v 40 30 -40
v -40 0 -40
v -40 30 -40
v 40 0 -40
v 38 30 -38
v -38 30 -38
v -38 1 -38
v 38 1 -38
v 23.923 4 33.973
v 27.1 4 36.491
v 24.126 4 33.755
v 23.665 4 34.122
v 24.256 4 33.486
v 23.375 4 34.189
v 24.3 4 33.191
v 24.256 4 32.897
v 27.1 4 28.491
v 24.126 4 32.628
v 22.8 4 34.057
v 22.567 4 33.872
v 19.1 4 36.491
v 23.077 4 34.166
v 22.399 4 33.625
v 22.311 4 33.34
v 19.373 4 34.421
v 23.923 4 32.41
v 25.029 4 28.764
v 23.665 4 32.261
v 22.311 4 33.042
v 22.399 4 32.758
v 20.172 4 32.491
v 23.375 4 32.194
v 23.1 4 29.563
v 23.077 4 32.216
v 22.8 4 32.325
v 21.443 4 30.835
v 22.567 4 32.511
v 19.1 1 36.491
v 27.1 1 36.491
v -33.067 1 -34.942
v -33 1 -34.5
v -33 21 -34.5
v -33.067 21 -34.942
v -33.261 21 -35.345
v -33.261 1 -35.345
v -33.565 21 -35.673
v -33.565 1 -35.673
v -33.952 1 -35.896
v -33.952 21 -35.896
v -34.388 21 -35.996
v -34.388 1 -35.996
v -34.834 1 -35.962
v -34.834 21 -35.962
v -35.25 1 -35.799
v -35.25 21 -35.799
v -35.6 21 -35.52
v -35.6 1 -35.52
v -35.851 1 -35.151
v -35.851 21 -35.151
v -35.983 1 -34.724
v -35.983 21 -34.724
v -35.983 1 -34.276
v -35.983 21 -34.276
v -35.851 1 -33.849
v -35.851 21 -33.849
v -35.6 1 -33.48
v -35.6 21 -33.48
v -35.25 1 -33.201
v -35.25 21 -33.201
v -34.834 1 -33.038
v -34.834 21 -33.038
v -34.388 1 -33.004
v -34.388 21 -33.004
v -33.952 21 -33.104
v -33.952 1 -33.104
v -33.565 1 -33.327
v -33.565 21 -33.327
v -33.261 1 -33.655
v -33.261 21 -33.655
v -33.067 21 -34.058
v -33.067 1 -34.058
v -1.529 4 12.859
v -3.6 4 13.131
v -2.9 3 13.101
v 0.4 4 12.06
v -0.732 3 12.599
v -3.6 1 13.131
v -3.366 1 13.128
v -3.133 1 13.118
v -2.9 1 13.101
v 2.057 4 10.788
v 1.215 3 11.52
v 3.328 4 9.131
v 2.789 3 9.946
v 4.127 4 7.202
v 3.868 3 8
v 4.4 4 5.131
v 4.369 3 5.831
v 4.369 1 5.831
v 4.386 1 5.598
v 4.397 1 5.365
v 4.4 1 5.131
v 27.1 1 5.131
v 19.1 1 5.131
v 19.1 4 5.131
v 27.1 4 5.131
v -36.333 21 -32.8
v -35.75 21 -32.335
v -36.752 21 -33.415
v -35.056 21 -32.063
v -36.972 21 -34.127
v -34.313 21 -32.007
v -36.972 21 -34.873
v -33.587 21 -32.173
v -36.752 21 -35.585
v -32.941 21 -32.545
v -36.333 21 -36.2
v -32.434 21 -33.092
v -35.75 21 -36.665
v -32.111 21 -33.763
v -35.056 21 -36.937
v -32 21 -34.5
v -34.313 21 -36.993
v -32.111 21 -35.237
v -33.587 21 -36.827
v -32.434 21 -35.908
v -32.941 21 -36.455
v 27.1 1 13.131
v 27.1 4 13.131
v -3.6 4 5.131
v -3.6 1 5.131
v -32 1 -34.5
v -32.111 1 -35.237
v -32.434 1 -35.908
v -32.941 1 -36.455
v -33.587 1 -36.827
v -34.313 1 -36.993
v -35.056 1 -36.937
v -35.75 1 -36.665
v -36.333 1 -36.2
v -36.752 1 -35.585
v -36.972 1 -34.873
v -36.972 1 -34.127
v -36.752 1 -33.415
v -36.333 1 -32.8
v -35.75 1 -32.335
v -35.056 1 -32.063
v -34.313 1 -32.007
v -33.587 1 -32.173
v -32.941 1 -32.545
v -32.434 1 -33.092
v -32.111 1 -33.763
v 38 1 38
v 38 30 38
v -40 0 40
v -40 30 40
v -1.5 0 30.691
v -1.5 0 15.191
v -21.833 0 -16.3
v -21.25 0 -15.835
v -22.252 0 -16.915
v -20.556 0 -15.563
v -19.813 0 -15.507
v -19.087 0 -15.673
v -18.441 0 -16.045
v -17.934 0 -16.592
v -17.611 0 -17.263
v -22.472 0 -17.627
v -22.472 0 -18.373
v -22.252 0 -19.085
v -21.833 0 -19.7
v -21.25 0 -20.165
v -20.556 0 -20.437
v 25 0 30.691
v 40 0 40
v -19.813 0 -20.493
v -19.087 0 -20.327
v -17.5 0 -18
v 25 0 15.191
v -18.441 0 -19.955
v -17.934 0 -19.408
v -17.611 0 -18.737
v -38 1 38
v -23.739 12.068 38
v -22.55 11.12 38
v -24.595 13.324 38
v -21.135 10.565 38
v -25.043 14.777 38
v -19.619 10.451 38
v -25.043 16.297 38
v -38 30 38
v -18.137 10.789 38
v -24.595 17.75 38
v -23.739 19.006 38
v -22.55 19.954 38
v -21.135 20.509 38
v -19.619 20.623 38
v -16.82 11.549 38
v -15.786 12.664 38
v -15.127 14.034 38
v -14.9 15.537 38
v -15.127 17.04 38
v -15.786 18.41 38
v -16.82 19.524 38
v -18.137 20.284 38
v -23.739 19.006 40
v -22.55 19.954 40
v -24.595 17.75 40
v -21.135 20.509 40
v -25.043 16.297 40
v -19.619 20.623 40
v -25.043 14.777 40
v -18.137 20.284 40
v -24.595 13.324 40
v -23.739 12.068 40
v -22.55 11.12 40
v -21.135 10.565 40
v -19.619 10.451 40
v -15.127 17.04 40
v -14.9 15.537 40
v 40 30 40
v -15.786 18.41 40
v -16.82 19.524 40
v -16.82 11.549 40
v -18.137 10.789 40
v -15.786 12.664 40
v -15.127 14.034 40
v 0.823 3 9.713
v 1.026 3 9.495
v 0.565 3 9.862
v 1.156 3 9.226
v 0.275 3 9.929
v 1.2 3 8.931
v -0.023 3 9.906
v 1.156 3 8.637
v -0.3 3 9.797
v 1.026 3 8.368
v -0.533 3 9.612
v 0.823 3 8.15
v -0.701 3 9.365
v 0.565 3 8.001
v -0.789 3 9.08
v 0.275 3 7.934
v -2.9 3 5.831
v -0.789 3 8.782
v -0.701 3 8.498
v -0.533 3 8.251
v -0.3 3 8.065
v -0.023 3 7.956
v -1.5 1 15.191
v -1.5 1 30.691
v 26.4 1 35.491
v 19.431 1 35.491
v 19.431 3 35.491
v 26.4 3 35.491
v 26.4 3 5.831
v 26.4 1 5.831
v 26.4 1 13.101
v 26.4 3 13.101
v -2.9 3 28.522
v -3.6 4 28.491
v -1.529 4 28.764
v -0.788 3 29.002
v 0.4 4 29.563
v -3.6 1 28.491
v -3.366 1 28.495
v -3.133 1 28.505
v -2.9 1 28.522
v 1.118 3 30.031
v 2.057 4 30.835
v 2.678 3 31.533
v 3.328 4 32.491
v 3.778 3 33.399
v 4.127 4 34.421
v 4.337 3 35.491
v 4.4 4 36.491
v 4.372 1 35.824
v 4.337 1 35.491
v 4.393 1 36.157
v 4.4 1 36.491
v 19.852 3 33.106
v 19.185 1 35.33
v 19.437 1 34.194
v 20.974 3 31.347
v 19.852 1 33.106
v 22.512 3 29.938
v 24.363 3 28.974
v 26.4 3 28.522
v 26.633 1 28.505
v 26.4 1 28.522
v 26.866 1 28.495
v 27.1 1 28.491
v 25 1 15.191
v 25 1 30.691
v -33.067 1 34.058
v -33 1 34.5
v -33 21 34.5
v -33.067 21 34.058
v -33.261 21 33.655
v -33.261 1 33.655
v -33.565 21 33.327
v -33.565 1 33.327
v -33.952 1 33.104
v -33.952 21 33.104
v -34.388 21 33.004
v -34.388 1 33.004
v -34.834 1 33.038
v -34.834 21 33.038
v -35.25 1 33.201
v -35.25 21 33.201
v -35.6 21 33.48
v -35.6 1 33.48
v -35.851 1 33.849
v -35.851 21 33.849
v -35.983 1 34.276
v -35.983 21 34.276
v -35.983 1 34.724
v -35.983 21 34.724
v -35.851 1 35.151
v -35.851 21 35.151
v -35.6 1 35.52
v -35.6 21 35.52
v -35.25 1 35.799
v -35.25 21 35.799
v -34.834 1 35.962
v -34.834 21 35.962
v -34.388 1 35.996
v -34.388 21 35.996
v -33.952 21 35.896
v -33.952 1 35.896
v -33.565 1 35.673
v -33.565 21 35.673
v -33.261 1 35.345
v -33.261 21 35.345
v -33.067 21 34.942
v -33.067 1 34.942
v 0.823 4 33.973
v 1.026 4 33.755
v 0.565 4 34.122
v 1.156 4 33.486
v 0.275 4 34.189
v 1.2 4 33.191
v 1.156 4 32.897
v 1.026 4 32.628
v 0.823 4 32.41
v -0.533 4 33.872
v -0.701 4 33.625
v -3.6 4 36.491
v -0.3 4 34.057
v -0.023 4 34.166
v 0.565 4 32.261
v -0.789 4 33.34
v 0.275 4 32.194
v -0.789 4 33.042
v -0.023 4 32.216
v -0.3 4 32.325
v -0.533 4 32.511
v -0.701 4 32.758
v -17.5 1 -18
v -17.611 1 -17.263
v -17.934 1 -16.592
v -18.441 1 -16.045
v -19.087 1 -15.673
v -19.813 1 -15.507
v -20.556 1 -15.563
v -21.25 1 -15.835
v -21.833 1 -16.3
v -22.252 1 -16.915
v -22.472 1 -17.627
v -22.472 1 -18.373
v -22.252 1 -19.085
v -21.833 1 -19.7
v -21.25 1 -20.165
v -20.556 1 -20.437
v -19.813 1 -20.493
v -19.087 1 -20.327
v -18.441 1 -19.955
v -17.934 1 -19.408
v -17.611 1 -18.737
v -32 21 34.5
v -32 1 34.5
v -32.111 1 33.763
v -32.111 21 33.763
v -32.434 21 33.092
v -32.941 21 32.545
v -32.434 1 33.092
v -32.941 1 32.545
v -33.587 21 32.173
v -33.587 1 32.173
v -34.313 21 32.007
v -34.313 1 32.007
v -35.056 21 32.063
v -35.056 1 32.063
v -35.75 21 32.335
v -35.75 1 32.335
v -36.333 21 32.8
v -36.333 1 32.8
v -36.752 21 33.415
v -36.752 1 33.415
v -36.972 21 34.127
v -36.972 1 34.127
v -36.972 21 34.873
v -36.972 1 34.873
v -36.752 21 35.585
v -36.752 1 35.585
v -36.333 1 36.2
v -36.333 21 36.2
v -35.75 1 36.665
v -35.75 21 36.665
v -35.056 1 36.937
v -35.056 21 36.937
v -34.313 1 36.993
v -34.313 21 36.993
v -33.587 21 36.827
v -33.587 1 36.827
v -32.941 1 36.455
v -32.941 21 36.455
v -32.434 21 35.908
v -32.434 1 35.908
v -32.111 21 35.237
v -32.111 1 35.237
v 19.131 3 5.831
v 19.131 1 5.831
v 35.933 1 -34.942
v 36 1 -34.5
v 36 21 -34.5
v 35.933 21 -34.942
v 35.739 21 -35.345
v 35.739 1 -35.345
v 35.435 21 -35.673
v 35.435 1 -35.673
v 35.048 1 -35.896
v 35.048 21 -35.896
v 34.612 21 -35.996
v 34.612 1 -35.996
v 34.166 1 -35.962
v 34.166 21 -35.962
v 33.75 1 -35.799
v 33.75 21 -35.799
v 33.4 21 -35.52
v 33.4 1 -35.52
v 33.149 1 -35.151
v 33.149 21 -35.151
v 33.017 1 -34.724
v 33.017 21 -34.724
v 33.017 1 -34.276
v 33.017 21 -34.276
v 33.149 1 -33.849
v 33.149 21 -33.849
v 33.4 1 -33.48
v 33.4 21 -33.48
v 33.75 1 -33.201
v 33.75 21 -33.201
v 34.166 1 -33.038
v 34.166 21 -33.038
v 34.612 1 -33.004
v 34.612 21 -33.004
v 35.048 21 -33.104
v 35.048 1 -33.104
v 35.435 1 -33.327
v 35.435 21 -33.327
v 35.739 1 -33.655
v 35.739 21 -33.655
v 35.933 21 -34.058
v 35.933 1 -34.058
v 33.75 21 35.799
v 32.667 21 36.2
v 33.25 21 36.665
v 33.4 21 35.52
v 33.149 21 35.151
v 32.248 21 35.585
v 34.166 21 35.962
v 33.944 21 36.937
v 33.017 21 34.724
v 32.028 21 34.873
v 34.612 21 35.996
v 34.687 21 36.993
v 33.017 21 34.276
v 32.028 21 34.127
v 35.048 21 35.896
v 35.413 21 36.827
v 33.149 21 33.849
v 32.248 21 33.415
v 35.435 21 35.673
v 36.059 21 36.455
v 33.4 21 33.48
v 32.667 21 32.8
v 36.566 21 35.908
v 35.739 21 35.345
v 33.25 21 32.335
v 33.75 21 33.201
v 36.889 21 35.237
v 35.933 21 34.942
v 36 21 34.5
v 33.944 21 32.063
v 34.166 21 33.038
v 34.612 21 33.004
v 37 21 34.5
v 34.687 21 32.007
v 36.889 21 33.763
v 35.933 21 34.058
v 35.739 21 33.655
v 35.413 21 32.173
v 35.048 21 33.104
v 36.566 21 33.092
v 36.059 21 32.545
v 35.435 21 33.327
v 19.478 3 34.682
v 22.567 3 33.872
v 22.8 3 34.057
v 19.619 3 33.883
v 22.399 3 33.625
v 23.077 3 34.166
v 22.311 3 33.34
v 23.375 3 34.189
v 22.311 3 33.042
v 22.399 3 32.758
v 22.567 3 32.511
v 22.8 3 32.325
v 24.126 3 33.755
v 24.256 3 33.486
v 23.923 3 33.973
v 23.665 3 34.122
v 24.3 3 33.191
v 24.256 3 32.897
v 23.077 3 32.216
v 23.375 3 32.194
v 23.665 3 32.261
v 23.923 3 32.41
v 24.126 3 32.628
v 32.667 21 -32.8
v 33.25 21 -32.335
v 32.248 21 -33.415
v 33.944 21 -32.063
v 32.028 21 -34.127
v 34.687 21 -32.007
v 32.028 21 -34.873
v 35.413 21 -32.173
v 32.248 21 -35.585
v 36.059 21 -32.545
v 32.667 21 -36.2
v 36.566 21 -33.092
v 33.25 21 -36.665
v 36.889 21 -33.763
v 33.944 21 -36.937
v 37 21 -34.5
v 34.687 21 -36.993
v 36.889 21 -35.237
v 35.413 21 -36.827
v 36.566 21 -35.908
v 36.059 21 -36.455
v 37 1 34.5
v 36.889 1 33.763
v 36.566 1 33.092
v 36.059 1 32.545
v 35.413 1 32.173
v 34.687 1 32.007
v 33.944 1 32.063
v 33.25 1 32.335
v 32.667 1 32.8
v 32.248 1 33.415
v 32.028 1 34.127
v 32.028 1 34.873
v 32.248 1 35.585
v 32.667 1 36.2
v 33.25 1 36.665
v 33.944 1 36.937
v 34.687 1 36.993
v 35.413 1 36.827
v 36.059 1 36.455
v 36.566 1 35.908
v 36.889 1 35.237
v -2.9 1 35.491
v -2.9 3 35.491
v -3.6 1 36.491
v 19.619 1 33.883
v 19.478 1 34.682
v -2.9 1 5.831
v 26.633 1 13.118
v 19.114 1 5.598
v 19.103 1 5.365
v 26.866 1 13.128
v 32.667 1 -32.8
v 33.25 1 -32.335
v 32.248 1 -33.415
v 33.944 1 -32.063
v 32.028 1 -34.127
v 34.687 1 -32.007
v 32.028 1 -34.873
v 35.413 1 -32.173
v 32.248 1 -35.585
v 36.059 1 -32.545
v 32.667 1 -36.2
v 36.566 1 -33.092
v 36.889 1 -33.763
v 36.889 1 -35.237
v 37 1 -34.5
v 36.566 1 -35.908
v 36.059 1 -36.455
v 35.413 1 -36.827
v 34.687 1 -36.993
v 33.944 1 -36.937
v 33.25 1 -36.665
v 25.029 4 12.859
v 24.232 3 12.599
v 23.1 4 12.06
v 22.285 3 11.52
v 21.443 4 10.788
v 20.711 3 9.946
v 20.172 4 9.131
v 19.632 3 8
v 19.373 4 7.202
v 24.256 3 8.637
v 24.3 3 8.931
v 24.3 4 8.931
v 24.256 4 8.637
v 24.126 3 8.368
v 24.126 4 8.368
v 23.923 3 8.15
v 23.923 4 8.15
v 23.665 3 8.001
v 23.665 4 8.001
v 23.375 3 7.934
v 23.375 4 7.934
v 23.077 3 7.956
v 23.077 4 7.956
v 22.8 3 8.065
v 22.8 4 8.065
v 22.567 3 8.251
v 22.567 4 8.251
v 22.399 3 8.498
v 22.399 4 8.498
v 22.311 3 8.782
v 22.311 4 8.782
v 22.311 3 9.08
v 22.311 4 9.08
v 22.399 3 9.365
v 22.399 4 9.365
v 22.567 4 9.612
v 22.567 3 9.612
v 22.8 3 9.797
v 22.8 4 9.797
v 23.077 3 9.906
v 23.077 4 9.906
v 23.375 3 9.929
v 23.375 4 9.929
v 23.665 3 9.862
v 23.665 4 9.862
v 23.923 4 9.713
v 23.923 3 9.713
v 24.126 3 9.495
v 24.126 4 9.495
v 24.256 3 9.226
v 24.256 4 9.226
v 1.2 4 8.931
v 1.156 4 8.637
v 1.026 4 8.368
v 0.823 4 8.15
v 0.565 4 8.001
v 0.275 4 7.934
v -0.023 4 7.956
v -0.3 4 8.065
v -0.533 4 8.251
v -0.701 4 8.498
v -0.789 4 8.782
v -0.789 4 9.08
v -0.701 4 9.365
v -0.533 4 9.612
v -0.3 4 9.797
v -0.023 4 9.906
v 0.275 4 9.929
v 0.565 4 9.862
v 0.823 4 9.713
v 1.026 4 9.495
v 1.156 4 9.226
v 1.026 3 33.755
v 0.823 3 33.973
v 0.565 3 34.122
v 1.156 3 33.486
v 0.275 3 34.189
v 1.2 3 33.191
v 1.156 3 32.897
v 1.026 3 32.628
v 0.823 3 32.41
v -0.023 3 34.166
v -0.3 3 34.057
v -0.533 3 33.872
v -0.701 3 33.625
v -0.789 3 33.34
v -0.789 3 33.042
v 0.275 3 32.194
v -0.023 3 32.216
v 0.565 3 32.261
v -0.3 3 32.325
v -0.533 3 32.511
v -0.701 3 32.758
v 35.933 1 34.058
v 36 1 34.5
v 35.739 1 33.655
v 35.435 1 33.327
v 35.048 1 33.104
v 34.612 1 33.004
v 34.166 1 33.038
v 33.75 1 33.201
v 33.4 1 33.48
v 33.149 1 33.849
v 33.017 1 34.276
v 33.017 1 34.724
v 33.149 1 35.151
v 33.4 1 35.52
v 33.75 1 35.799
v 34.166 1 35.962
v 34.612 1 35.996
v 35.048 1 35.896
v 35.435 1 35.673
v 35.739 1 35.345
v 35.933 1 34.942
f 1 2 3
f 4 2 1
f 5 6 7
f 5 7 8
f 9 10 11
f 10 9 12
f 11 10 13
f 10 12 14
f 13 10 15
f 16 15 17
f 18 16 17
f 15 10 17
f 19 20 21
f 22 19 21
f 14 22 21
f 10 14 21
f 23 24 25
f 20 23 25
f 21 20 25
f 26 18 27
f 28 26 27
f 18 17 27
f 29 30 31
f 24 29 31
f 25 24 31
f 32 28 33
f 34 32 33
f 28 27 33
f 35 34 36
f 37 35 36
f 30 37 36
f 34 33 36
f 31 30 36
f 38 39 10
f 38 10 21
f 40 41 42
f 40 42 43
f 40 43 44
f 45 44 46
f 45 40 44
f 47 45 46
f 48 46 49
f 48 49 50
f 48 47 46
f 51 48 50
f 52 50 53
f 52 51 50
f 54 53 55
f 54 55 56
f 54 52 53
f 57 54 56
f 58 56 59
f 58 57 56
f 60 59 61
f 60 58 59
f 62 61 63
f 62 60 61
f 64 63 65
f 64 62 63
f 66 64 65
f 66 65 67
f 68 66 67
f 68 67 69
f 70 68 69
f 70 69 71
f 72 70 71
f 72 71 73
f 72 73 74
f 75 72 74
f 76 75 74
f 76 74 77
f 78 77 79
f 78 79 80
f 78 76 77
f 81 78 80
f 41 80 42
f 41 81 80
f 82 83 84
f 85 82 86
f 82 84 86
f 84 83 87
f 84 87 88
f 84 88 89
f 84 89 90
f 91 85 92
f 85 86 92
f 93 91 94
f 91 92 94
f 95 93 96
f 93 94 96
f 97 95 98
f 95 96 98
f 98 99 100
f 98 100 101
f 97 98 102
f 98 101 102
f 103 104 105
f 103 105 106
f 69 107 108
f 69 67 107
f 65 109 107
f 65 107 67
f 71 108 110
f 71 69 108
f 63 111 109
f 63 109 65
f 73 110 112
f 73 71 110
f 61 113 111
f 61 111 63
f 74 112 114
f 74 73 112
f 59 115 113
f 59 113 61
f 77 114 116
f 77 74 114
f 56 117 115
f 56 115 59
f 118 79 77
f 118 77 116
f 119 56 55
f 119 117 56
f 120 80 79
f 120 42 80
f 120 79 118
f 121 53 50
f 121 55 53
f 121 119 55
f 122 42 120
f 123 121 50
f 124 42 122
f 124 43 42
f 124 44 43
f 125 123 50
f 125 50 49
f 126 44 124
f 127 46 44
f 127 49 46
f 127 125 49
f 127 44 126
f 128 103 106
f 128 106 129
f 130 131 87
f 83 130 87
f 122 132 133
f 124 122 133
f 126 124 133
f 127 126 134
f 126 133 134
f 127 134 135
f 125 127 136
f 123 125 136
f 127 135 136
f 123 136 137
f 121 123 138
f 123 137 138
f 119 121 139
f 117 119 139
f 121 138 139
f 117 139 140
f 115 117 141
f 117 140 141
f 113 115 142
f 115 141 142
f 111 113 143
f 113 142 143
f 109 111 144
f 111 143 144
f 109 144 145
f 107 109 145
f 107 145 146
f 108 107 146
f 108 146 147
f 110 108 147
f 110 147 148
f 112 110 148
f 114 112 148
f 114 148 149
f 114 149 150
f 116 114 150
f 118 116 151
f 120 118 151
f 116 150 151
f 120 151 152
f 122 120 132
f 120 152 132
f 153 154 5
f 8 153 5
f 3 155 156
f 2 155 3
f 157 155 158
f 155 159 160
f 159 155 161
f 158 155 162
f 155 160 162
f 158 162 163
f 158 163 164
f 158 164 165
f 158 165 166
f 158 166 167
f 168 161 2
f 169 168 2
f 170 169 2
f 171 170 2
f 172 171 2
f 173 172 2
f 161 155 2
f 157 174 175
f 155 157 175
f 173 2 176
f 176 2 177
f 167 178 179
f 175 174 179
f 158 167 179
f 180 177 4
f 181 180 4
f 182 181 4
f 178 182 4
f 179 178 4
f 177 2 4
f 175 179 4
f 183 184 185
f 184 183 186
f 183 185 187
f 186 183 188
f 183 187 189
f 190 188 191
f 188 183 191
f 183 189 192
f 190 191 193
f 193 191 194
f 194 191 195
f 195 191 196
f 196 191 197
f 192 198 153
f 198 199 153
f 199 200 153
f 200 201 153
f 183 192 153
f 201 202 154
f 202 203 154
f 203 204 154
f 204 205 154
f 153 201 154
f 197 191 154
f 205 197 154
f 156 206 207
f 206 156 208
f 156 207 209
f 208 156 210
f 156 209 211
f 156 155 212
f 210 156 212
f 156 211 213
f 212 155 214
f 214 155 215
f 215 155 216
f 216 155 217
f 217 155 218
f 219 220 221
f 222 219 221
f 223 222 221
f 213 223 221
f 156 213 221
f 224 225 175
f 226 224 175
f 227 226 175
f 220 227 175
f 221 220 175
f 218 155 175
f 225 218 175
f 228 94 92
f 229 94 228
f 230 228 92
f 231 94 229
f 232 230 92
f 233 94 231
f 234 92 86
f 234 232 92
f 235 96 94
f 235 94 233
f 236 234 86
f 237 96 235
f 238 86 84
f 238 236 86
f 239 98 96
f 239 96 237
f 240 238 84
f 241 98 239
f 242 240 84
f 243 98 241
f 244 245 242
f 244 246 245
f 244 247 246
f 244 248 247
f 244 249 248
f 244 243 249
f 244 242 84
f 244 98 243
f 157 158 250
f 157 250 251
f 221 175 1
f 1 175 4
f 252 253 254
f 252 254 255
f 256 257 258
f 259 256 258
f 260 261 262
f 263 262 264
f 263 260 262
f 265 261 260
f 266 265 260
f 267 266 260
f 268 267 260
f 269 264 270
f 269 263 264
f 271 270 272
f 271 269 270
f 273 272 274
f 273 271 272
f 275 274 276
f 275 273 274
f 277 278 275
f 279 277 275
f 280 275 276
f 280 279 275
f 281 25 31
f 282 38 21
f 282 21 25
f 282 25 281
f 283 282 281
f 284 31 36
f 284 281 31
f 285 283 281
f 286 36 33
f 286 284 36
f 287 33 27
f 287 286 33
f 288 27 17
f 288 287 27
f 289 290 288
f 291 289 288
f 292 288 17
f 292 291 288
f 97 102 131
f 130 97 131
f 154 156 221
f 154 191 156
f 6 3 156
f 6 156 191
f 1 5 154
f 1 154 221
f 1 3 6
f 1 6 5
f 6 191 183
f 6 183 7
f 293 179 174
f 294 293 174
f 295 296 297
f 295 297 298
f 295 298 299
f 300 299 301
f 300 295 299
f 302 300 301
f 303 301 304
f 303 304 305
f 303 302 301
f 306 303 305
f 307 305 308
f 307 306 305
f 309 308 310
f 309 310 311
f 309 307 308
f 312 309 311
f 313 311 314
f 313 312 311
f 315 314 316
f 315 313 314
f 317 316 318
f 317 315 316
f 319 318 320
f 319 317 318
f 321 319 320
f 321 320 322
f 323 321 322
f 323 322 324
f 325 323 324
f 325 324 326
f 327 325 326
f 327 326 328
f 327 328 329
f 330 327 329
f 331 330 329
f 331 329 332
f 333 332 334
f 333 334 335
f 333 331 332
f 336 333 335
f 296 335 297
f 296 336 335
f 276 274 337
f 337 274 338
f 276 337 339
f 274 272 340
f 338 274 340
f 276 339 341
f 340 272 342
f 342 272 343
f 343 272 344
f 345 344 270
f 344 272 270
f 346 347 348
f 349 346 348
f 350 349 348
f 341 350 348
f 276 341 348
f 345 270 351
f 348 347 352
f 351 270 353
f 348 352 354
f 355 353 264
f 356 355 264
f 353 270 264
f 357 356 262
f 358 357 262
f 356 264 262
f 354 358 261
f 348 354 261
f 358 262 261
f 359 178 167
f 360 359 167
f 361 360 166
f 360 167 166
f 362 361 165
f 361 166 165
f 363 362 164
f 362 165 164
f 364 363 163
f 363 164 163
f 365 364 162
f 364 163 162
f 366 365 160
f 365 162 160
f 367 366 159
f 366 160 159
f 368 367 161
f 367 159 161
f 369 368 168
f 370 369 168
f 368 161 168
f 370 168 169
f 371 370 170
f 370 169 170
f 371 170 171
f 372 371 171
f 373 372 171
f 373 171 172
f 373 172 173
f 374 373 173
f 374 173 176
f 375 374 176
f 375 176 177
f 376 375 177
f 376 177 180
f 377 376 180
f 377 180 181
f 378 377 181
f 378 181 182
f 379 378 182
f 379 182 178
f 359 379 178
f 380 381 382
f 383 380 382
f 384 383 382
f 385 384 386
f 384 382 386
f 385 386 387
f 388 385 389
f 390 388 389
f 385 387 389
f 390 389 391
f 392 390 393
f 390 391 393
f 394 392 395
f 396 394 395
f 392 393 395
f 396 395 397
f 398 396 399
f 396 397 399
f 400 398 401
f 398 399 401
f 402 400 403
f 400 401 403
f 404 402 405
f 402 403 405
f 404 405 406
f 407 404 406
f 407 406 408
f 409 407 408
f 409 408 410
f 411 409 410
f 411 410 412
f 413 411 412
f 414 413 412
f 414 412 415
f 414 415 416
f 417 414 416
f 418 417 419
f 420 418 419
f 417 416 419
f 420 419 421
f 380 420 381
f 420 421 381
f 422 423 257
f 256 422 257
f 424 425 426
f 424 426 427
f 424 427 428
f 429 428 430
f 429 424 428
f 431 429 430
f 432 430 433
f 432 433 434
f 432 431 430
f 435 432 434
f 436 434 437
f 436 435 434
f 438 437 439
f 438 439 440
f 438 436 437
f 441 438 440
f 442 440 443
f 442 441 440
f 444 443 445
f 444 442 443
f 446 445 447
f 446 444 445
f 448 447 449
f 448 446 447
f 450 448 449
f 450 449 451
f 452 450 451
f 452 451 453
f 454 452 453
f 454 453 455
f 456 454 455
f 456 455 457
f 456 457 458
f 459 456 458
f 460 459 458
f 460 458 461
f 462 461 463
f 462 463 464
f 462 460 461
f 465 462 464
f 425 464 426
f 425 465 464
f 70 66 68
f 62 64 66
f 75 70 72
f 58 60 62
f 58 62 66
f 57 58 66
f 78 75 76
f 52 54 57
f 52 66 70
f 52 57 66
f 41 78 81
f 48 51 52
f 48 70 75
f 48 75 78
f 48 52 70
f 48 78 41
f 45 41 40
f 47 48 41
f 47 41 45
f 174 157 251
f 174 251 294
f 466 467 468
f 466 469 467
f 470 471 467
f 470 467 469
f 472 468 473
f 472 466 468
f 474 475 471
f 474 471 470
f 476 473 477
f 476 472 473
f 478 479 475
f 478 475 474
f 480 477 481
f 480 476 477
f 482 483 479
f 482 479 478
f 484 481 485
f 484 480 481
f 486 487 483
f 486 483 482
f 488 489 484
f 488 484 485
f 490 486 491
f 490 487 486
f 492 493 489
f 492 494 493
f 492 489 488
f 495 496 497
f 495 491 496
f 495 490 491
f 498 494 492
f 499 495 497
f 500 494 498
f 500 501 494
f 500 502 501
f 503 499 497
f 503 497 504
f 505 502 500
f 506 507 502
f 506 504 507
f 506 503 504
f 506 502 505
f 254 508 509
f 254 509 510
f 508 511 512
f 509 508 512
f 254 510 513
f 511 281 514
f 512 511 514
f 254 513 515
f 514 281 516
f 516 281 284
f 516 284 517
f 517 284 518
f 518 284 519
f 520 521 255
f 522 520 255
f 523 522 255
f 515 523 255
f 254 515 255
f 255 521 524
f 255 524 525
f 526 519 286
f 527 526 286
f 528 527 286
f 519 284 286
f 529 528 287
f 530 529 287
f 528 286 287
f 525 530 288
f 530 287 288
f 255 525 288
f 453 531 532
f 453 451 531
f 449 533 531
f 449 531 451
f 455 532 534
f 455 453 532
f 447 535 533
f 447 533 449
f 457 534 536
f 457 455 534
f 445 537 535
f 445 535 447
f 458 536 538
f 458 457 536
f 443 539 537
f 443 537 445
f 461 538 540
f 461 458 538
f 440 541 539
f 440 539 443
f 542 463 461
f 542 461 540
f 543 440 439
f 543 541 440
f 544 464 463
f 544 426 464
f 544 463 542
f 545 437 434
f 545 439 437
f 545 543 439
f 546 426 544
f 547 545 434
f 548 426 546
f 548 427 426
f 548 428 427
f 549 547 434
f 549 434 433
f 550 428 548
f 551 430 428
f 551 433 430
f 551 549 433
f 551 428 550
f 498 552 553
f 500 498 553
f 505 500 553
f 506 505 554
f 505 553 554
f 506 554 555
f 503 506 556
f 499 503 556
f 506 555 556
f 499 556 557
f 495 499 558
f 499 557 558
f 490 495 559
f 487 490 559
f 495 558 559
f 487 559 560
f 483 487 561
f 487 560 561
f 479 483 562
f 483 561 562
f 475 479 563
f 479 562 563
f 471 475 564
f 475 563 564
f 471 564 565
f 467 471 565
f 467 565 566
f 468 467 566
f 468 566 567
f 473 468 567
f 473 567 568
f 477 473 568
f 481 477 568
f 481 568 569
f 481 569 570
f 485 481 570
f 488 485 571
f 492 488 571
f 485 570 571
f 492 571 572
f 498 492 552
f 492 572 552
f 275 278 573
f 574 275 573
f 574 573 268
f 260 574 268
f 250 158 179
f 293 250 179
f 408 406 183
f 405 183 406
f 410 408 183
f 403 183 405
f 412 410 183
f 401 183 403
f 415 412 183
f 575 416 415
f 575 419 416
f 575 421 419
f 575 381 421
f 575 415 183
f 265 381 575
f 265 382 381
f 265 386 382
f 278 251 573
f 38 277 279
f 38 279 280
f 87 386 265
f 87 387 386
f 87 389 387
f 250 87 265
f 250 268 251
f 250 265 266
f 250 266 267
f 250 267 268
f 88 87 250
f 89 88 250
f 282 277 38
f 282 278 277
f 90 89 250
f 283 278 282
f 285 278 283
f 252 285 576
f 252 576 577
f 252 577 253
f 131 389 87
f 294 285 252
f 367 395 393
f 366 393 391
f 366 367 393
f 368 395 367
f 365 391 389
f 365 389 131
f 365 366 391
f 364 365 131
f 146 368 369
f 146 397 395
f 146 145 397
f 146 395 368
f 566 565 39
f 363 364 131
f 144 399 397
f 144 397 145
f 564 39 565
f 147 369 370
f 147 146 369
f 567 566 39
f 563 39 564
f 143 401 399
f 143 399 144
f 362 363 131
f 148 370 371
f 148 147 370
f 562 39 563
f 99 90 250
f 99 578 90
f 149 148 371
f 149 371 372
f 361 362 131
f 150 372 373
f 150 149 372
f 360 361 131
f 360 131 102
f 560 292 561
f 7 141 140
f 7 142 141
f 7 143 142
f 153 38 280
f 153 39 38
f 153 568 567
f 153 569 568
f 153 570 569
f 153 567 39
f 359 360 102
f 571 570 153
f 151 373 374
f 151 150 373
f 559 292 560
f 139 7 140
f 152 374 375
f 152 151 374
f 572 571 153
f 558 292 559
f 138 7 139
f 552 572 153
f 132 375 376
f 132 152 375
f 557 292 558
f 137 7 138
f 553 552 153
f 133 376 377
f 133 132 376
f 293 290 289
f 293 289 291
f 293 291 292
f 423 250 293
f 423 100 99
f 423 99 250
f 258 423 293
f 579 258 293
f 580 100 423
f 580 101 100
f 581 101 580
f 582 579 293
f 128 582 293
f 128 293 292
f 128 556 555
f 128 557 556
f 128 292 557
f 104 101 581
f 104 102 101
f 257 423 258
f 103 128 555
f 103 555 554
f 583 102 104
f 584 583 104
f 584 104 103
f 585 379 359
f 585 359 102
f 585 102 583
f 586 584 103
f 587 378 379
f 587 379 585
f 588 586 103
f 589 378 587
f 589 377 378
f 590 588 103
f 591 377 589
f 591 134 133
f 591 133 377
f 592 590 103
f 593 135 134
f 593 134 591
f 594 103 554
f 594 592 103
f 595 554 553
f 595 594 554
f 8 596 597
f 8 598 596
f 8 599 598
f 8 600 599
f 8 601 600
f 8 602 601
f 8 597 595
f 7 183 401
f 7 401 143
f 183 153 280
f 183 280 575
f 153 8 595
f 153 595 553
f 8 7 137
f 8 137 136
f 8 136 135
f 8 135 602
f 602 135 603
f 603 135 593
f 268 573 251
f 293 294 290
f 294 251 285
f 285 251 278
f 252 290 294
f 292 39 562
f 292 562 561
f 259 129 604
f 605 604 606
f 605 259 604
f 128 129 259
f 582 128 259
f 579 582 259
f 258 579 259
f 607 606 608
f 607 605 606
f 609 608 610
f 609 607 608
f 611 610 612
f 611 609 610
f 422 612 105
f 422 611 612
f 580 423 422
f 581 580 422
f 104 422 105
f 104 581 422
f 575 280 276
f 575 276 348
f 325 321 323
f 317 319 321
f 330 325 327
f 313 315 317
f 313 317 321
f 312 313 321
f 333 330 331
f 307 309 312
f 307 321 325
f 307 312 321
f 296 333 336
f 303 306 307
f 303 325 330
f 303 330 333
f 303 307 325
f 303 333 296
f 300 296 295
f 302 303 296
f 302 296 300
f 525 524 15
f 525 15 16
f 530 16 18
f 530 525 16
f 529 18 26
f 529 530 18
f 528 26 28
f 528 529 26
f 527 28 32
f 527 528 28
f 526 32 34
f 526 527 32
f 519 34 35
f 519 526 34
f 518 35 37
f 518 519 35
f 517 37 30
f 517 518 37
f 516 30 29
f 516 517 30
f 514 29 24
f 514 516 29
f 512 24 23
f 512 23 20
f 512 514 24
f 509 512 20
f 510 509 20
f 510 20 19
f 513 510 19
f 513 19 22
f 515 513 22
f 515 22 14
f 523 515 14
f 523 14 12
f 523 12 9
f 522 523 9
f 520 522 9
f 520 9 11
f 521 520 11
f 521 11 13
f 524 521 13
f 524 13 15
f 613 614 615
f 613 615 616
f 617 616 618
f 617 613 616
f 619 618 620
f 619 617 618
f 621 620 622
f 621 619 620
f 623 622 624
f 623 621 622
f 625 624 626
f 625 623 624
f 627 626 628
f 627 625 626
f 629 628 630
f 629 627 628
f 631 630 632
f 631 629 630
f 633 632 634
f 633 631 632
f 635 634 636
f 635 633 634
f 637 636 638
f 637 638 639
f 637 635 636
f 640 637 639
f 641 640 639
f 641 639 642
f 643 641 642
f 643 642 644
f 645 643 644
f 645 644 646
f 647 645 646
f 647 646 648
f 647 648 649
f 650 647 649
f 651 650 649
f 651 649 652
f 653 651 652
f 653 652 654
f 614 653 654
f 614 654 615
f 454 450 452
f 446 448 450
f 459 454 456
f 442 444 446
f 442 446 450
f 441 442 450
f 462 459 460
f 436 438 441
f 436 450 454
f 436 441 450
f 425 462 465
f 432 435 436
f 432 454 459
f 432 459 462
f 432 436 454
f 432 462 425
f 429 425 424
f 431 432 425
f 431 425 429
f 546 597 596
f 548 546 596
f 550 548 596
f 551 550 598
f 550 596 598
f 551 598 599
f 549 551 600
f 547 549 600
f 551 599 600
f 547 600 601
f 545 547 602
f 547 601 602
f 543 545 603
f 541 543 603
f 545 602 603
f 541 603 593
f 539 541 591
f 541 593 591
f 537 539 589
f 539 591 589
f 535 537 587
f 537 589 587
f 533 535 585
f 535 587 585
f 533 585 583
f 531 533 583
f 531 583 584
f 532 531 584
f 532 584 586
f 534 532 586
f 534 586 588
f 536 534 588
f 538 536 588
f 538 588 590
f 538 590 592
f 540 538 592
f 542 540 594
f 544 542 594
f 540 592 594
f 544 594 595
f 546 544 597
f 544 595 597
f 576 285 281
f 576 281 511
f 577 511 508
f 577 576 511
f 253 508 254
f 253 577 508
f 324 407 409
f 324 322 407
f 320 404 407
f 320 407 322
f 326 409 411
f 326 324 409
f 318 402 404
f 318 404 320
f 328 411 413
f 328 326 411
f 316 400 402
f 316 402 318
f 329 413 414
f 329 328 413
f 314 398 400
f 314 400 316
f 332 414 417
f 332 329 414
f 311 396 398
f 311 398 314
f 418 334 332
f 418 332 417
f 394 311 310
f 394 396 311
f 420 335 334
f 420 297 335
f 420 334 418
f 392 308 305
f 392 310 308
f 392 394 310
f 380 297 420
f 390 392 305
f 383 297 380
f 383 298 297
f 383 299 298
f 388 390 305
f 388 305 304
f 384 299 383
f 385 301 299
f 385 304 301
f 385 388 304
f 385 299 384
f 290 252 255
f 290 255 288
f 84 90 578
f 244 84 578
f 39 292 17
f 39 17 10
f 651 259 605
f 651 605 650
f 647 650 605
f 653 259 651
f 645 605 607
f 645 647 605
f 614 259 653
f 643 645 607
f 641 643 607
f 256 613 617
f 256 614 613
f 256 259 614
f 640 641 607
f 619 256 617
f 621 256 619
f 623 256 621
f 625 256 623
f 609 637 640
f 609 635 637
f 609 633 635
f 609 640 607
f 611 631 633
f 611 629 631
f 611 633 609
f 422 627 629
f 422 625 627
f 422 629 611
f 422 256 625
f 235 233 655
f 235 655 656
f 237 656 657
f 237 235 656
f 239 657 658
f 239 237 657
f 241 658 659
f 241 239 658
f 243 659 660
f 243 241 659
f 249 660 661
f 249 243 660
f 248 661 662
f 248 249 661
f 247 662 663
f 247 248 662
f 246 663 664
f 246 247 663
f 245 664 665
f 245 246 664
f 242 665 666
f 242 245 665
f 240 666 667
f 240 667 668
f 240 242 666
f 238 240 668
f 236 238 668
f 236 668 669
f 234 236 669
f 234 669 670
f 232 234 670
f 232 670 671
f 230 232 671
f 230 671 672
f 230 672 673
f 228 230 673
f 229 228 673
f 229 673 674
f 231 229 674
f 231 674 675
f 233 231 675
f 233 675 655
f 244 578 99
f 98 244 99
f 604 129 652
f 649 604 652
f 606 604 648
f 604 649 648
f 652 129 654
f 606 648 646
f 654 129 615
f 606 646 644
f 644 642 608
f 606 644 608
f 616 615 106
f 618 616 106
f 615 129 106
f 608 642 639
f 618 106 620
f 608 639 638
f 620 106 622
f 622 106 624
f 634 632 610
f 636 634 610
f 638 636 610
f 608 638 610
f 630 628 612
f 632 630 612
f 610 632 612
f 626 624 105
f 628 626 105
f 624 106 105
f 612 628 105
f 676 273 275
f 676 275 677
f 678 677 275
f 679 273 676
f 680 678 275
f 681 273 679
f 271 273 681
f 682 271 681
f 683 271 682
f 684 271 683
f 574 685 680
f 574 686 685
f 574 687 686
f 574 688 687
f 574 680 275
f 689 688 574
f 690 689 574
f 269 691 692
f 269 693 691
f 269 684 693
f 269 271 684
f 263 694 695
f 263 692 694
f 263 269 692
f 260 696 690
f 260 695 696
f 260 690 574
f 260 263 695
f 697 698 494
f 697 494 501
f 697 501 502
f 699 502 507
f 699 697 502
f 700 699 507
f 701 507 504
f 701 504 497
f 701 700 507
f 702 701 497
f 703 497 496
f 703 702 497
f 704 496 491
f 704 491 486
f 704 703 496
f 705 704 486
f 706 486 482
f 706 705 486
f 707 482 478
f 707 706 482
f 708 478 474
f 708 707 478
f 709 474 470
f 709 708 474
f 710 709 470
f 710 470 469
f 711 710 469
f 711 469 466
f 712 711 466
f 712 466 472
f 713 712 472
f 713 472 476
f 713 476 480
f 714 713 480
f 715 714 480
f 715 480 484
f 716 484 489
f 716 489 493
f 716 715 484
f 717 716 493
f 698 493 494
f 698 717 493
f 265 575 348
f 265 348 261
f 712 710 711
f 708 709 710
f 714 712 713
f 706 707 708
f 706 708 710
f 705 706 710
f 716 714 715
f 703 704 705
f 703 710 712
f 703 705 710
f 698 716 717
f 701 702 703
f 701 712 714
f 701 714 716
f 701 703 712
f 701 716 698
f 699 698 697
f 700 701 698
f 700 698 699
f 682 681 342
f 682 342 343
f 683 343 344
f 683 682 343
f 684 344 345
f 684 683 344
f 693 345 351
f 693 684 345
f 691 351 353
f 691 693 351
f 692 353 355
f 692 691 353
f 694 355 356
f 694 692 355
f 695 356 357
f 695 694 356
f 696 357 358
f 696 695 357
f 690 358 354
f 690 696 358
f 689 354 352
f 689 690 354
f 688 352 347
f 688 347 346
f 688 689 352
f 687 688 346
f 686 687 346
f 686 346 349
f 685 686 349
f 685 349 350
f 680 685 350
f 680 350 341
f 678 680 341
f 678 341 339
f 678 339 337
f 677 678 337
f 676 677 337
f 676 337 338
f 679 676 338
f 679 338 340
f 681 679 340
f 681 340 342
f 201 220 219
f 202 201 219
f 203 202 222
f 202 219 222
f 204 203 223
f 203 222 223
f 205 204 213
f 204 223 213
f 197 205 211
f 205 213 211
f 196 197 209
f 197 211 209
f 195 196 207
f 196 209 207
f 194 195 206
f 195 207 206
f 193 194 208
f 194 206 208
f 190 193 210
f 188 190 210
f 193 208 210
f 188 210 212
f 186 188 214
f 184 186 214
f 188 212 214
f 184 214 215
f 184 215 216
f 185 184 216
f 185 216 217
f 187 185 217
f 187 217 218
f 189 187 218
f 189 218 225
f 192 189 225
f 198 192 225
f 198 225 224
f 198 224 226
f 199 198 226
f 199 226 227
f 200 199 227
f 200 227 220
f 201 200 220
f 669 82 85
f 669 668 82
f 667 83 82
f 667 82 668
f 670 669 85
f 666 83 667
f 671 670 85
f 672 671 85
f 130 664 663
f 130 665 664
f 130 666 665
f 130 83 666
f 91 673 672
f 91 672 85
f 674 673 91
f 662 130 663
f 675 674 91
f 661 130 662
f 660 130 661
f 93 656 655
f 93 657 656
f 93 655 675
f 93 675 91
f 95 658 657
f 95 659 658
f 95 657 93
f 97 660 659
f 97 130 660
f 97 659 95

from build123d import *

# Parameters (mm, degrees)
SKETCH1_W           = 80
SKETCH1_H           = 80
BOSS_EXTRUDE1_DEPTH = 30
SKETCH2_W           = 76
SKETCH2_H           = 76
CUT_EXTRUDE1_DEPTH  = 29
SKETCH3_R           = 2.5
SKETCH3_R_2         = 1.5
BOSS_EXTRUDE5_DEPTH = 20
SKETCH4_R           = 2.5
CUT_EXTRUDE2_DEPTH  = 10
SKETCH5_W           = 26.5
SKETCH5_H           = 15.5
CUT_EXTRUDE3_DEPTH  = 25
SKETCH6_R           = 5.1
CUT_EXTRUDE4_DEPTH  = 10
BOSS_EXTRUDE6_DEPTH = 3
CUT_EXTRUDE5_DEPTH  = 2
SKETCH10_R          = 1
CUT_EXTRUDE6_DEPTH  = 3


with BuildPart() as part:
    # Sketch1 → Boss-Extrude1 (new body)
    with BuildSketch(Plane(origin=(0, 0, 0), x_dir=(1, 0, 0), z_dir=(0, 1, 0))):
        Rectangle(SKETCH1_W, SKETCH1_H)
    extrude(amount=BOSS_EXTRUDE1_DEPTH)

    # Sketch2 → Cut-Extrude1 (cut)
    with BuildSketch(Plane(origin=(0, 30, 0), x_dir=(1, 0, 0), z_dir=(0, 1, 0))):
        Rectangle(SKETCH2_W, SKETCH2_H)
    extrude(amount=-CUT_EXTRUDE1_DEPTH, mode=Mode.SUBTRACT)

    # Sketch3 → Boss-Extrude5 (add)
    with BuildSketch(Plane(origin=(0, 1, 0), x_dir=(1, 0, 0), z_dir=(0, 1, 0))):
        with Locations((-34.5, 34.5)):
            Circle(SKETCH3_R)
        with Locations((-34.5, 34.5)):
            Circle(SKETCH3_R_2, mode=Mode.SUBTRACT)
        with Locations((34.5, 34.5)):
            Circle(SKETCH3_R)
        with Locations((34.5, 34.5)):
            Circle(SKETCH3_R_2, mode=Mode.SUBTRACT)
        with Locations((-34.5, -34.5)):
            Circle(SKETCH3_R)
        with Locations((-34.5, -34.5)):
            Circle(SKETCH3_R_2, mode=Mode.SUBTRACT)
        with Locations((34.5, -34.5)):
            Circle(SKETCH3_R)
        with Locations((34.5, -34.5)):
            Circle(SKETCH3_R_2, mode=Mode.SUBTRACT)
    extrude(amount=BOSS_EXTRUDE5_DEPTH)

    # Sketch4 → Cut-Extrude2 (cut)
    with BuildSketch(Plane.XZ):
        with Locations((-20, -18)):
            Circle(SKETCH4_R)
    extrude(amount=-CUT_EXTRUDE2_DEPTH, mode=Mode.SUBTRACT)

    # Sketch5 → Cut-Extrude3 (cut)
    with BuildSketch(Plane.XZ):
        with Locations((11.75, 22.941412849)):
            Rectangle(SKETCH5_W, SKETCH5_H)
    extrude(amount=-CUT_EXTRUDE3_DEPTH, mode=Mode.SUBTRACT)

    # Sketch6 → Cut-Extrude4 (cut)
    with BuildSketch(Plane.XY.offset(40)):
        with Locations((-20, 15.536781198)):
            Circle(SKETCH6_R)
    extrude(amount=-CUT_EXTRUDE4_DEPTH, mode=Mode.SUBTRACT)

    # Sketch11 → Boss-Extrude6 (add)
    with BuildSketch(Plane(origin=(0, 1, 0), x_dir=(1, 0, 0), z_dir=(0, 1, 0))):
        with BuildLine():
            Line((-3.6, -5.131412849), (-3.6, -13.131412849))
            ThreePointArc((-3.6, -13.131412849), (2.056854249, -10.788267099), (4.4, -5.131412849))
            Line((4.4, -5.131412849), (-3.6, -5.131412849))
        make_face()
        with BuildLine():
            Line((19.1, -5.131412849), (27.1, -5.131412849))
            Line((27.1, -5.131412849), (27.1, -13.131412849))
            ThreePointArc((27.1, -13.131412849), (21.443145751, -10.788267099), (19.1, -5.131412849))
        make_face()
        with BuildLine():
            Line((27.1, -28.491412849), (27.1, -36.491412849))
            Line((27.1, -36.491412849), (19.1, -36.491412849))
            ThreePointArc((19.1, -36.491412849), (21.443145751, -30.8345586), (27.1, -28.491412849))
        make_face()
        with BuildLine():
            Line((4.4, -36.491412849), (-3.6, -36.491412849))
            Line((-3.6, -36.491412849), (-3.6, -28.491412849))
            ThreePointArc((-3.6, -28.491412849), (2.056854249, -30.8345586), (4.4, -36.491412849))
        make_face()
    extrude(amount=BOSS_EXTRUDE6_DEPTH)

    # Sketch12 → Cut-Extrude5 (cut)
    with BuildSketch(Plane(origin=(0, 1, 0), x_dir=(1, 0, 0), z_dir=(0, 1, 0))):
        with BuildLine():
            Line((-2.9, -13.100729005), (-2.9, -5.831412849))
            Line((-2.9, -5.831412849), (4.369316156, -5.831412849))
            ThreePointArc((4.369316156, -5.831412849), (2.240182749, -10.971595598), (-2.9, -13.100729005))
        make_face()
        with BuildLine():
            Line((19.130683844, -5.831412849), (26.4, -5.831412849))
            Line((26.4, -5.831412849), (26.4, -13.100729005))
            ThreePointArc((26.4, -13.100729005), (21.259817251, -10.971595598), (19.130683844, -5.831412849))
        make_face()
        with BuildLine():
            Line((26.4, -35.491412849), (26.4, -28.522096693))
            ThreePointArc((26.4, -28.522096693), (21.471949286, -30.563362135), (19.430683844, -35.491412849))
            Line((19.430683844, -35.491412849), (26.4, -35.491412849))
        make_face()
        with BuildLine():
            Line((4.337253933, -35.491412849), (-2.9, -35.491412849))
            Line((-2.9, -35.491412849), (-2.9, -28.254158916))
            ThreePointArc((-2.9, -28.254158916), (2.217511333, -30.373901516), (4.337253933, -35.491412849))
        make_face()
    extrude(amount=CUT_EXTRUDE5_DEPTH, mode=Mode.SUBTRACT)

    # Sketch10 → Cut-Extrude6 (cut)
    with BuildSketch(Plane(origin=(0, 1, 0), x_dir=(1, 0, 0), z_dir=(0, 1, 0))):
        with Locations((0.2, -8.931412849)):
            Circle(SKETCH10_R)
        with Locations((23.3, -8.931412849)):
            Circle(SKETCH10_R)
        with Locations((0.2, -33.191412849)):
            Circle(SKETCH10_R)
        with Locations((23.3, -33.191412849)):
            Circle(SKETCH10_R)
    extrude(amount=CUT_EXTRUDE6_DEPTH, mode=Mode.SUBTRACT)


solid = part.part
